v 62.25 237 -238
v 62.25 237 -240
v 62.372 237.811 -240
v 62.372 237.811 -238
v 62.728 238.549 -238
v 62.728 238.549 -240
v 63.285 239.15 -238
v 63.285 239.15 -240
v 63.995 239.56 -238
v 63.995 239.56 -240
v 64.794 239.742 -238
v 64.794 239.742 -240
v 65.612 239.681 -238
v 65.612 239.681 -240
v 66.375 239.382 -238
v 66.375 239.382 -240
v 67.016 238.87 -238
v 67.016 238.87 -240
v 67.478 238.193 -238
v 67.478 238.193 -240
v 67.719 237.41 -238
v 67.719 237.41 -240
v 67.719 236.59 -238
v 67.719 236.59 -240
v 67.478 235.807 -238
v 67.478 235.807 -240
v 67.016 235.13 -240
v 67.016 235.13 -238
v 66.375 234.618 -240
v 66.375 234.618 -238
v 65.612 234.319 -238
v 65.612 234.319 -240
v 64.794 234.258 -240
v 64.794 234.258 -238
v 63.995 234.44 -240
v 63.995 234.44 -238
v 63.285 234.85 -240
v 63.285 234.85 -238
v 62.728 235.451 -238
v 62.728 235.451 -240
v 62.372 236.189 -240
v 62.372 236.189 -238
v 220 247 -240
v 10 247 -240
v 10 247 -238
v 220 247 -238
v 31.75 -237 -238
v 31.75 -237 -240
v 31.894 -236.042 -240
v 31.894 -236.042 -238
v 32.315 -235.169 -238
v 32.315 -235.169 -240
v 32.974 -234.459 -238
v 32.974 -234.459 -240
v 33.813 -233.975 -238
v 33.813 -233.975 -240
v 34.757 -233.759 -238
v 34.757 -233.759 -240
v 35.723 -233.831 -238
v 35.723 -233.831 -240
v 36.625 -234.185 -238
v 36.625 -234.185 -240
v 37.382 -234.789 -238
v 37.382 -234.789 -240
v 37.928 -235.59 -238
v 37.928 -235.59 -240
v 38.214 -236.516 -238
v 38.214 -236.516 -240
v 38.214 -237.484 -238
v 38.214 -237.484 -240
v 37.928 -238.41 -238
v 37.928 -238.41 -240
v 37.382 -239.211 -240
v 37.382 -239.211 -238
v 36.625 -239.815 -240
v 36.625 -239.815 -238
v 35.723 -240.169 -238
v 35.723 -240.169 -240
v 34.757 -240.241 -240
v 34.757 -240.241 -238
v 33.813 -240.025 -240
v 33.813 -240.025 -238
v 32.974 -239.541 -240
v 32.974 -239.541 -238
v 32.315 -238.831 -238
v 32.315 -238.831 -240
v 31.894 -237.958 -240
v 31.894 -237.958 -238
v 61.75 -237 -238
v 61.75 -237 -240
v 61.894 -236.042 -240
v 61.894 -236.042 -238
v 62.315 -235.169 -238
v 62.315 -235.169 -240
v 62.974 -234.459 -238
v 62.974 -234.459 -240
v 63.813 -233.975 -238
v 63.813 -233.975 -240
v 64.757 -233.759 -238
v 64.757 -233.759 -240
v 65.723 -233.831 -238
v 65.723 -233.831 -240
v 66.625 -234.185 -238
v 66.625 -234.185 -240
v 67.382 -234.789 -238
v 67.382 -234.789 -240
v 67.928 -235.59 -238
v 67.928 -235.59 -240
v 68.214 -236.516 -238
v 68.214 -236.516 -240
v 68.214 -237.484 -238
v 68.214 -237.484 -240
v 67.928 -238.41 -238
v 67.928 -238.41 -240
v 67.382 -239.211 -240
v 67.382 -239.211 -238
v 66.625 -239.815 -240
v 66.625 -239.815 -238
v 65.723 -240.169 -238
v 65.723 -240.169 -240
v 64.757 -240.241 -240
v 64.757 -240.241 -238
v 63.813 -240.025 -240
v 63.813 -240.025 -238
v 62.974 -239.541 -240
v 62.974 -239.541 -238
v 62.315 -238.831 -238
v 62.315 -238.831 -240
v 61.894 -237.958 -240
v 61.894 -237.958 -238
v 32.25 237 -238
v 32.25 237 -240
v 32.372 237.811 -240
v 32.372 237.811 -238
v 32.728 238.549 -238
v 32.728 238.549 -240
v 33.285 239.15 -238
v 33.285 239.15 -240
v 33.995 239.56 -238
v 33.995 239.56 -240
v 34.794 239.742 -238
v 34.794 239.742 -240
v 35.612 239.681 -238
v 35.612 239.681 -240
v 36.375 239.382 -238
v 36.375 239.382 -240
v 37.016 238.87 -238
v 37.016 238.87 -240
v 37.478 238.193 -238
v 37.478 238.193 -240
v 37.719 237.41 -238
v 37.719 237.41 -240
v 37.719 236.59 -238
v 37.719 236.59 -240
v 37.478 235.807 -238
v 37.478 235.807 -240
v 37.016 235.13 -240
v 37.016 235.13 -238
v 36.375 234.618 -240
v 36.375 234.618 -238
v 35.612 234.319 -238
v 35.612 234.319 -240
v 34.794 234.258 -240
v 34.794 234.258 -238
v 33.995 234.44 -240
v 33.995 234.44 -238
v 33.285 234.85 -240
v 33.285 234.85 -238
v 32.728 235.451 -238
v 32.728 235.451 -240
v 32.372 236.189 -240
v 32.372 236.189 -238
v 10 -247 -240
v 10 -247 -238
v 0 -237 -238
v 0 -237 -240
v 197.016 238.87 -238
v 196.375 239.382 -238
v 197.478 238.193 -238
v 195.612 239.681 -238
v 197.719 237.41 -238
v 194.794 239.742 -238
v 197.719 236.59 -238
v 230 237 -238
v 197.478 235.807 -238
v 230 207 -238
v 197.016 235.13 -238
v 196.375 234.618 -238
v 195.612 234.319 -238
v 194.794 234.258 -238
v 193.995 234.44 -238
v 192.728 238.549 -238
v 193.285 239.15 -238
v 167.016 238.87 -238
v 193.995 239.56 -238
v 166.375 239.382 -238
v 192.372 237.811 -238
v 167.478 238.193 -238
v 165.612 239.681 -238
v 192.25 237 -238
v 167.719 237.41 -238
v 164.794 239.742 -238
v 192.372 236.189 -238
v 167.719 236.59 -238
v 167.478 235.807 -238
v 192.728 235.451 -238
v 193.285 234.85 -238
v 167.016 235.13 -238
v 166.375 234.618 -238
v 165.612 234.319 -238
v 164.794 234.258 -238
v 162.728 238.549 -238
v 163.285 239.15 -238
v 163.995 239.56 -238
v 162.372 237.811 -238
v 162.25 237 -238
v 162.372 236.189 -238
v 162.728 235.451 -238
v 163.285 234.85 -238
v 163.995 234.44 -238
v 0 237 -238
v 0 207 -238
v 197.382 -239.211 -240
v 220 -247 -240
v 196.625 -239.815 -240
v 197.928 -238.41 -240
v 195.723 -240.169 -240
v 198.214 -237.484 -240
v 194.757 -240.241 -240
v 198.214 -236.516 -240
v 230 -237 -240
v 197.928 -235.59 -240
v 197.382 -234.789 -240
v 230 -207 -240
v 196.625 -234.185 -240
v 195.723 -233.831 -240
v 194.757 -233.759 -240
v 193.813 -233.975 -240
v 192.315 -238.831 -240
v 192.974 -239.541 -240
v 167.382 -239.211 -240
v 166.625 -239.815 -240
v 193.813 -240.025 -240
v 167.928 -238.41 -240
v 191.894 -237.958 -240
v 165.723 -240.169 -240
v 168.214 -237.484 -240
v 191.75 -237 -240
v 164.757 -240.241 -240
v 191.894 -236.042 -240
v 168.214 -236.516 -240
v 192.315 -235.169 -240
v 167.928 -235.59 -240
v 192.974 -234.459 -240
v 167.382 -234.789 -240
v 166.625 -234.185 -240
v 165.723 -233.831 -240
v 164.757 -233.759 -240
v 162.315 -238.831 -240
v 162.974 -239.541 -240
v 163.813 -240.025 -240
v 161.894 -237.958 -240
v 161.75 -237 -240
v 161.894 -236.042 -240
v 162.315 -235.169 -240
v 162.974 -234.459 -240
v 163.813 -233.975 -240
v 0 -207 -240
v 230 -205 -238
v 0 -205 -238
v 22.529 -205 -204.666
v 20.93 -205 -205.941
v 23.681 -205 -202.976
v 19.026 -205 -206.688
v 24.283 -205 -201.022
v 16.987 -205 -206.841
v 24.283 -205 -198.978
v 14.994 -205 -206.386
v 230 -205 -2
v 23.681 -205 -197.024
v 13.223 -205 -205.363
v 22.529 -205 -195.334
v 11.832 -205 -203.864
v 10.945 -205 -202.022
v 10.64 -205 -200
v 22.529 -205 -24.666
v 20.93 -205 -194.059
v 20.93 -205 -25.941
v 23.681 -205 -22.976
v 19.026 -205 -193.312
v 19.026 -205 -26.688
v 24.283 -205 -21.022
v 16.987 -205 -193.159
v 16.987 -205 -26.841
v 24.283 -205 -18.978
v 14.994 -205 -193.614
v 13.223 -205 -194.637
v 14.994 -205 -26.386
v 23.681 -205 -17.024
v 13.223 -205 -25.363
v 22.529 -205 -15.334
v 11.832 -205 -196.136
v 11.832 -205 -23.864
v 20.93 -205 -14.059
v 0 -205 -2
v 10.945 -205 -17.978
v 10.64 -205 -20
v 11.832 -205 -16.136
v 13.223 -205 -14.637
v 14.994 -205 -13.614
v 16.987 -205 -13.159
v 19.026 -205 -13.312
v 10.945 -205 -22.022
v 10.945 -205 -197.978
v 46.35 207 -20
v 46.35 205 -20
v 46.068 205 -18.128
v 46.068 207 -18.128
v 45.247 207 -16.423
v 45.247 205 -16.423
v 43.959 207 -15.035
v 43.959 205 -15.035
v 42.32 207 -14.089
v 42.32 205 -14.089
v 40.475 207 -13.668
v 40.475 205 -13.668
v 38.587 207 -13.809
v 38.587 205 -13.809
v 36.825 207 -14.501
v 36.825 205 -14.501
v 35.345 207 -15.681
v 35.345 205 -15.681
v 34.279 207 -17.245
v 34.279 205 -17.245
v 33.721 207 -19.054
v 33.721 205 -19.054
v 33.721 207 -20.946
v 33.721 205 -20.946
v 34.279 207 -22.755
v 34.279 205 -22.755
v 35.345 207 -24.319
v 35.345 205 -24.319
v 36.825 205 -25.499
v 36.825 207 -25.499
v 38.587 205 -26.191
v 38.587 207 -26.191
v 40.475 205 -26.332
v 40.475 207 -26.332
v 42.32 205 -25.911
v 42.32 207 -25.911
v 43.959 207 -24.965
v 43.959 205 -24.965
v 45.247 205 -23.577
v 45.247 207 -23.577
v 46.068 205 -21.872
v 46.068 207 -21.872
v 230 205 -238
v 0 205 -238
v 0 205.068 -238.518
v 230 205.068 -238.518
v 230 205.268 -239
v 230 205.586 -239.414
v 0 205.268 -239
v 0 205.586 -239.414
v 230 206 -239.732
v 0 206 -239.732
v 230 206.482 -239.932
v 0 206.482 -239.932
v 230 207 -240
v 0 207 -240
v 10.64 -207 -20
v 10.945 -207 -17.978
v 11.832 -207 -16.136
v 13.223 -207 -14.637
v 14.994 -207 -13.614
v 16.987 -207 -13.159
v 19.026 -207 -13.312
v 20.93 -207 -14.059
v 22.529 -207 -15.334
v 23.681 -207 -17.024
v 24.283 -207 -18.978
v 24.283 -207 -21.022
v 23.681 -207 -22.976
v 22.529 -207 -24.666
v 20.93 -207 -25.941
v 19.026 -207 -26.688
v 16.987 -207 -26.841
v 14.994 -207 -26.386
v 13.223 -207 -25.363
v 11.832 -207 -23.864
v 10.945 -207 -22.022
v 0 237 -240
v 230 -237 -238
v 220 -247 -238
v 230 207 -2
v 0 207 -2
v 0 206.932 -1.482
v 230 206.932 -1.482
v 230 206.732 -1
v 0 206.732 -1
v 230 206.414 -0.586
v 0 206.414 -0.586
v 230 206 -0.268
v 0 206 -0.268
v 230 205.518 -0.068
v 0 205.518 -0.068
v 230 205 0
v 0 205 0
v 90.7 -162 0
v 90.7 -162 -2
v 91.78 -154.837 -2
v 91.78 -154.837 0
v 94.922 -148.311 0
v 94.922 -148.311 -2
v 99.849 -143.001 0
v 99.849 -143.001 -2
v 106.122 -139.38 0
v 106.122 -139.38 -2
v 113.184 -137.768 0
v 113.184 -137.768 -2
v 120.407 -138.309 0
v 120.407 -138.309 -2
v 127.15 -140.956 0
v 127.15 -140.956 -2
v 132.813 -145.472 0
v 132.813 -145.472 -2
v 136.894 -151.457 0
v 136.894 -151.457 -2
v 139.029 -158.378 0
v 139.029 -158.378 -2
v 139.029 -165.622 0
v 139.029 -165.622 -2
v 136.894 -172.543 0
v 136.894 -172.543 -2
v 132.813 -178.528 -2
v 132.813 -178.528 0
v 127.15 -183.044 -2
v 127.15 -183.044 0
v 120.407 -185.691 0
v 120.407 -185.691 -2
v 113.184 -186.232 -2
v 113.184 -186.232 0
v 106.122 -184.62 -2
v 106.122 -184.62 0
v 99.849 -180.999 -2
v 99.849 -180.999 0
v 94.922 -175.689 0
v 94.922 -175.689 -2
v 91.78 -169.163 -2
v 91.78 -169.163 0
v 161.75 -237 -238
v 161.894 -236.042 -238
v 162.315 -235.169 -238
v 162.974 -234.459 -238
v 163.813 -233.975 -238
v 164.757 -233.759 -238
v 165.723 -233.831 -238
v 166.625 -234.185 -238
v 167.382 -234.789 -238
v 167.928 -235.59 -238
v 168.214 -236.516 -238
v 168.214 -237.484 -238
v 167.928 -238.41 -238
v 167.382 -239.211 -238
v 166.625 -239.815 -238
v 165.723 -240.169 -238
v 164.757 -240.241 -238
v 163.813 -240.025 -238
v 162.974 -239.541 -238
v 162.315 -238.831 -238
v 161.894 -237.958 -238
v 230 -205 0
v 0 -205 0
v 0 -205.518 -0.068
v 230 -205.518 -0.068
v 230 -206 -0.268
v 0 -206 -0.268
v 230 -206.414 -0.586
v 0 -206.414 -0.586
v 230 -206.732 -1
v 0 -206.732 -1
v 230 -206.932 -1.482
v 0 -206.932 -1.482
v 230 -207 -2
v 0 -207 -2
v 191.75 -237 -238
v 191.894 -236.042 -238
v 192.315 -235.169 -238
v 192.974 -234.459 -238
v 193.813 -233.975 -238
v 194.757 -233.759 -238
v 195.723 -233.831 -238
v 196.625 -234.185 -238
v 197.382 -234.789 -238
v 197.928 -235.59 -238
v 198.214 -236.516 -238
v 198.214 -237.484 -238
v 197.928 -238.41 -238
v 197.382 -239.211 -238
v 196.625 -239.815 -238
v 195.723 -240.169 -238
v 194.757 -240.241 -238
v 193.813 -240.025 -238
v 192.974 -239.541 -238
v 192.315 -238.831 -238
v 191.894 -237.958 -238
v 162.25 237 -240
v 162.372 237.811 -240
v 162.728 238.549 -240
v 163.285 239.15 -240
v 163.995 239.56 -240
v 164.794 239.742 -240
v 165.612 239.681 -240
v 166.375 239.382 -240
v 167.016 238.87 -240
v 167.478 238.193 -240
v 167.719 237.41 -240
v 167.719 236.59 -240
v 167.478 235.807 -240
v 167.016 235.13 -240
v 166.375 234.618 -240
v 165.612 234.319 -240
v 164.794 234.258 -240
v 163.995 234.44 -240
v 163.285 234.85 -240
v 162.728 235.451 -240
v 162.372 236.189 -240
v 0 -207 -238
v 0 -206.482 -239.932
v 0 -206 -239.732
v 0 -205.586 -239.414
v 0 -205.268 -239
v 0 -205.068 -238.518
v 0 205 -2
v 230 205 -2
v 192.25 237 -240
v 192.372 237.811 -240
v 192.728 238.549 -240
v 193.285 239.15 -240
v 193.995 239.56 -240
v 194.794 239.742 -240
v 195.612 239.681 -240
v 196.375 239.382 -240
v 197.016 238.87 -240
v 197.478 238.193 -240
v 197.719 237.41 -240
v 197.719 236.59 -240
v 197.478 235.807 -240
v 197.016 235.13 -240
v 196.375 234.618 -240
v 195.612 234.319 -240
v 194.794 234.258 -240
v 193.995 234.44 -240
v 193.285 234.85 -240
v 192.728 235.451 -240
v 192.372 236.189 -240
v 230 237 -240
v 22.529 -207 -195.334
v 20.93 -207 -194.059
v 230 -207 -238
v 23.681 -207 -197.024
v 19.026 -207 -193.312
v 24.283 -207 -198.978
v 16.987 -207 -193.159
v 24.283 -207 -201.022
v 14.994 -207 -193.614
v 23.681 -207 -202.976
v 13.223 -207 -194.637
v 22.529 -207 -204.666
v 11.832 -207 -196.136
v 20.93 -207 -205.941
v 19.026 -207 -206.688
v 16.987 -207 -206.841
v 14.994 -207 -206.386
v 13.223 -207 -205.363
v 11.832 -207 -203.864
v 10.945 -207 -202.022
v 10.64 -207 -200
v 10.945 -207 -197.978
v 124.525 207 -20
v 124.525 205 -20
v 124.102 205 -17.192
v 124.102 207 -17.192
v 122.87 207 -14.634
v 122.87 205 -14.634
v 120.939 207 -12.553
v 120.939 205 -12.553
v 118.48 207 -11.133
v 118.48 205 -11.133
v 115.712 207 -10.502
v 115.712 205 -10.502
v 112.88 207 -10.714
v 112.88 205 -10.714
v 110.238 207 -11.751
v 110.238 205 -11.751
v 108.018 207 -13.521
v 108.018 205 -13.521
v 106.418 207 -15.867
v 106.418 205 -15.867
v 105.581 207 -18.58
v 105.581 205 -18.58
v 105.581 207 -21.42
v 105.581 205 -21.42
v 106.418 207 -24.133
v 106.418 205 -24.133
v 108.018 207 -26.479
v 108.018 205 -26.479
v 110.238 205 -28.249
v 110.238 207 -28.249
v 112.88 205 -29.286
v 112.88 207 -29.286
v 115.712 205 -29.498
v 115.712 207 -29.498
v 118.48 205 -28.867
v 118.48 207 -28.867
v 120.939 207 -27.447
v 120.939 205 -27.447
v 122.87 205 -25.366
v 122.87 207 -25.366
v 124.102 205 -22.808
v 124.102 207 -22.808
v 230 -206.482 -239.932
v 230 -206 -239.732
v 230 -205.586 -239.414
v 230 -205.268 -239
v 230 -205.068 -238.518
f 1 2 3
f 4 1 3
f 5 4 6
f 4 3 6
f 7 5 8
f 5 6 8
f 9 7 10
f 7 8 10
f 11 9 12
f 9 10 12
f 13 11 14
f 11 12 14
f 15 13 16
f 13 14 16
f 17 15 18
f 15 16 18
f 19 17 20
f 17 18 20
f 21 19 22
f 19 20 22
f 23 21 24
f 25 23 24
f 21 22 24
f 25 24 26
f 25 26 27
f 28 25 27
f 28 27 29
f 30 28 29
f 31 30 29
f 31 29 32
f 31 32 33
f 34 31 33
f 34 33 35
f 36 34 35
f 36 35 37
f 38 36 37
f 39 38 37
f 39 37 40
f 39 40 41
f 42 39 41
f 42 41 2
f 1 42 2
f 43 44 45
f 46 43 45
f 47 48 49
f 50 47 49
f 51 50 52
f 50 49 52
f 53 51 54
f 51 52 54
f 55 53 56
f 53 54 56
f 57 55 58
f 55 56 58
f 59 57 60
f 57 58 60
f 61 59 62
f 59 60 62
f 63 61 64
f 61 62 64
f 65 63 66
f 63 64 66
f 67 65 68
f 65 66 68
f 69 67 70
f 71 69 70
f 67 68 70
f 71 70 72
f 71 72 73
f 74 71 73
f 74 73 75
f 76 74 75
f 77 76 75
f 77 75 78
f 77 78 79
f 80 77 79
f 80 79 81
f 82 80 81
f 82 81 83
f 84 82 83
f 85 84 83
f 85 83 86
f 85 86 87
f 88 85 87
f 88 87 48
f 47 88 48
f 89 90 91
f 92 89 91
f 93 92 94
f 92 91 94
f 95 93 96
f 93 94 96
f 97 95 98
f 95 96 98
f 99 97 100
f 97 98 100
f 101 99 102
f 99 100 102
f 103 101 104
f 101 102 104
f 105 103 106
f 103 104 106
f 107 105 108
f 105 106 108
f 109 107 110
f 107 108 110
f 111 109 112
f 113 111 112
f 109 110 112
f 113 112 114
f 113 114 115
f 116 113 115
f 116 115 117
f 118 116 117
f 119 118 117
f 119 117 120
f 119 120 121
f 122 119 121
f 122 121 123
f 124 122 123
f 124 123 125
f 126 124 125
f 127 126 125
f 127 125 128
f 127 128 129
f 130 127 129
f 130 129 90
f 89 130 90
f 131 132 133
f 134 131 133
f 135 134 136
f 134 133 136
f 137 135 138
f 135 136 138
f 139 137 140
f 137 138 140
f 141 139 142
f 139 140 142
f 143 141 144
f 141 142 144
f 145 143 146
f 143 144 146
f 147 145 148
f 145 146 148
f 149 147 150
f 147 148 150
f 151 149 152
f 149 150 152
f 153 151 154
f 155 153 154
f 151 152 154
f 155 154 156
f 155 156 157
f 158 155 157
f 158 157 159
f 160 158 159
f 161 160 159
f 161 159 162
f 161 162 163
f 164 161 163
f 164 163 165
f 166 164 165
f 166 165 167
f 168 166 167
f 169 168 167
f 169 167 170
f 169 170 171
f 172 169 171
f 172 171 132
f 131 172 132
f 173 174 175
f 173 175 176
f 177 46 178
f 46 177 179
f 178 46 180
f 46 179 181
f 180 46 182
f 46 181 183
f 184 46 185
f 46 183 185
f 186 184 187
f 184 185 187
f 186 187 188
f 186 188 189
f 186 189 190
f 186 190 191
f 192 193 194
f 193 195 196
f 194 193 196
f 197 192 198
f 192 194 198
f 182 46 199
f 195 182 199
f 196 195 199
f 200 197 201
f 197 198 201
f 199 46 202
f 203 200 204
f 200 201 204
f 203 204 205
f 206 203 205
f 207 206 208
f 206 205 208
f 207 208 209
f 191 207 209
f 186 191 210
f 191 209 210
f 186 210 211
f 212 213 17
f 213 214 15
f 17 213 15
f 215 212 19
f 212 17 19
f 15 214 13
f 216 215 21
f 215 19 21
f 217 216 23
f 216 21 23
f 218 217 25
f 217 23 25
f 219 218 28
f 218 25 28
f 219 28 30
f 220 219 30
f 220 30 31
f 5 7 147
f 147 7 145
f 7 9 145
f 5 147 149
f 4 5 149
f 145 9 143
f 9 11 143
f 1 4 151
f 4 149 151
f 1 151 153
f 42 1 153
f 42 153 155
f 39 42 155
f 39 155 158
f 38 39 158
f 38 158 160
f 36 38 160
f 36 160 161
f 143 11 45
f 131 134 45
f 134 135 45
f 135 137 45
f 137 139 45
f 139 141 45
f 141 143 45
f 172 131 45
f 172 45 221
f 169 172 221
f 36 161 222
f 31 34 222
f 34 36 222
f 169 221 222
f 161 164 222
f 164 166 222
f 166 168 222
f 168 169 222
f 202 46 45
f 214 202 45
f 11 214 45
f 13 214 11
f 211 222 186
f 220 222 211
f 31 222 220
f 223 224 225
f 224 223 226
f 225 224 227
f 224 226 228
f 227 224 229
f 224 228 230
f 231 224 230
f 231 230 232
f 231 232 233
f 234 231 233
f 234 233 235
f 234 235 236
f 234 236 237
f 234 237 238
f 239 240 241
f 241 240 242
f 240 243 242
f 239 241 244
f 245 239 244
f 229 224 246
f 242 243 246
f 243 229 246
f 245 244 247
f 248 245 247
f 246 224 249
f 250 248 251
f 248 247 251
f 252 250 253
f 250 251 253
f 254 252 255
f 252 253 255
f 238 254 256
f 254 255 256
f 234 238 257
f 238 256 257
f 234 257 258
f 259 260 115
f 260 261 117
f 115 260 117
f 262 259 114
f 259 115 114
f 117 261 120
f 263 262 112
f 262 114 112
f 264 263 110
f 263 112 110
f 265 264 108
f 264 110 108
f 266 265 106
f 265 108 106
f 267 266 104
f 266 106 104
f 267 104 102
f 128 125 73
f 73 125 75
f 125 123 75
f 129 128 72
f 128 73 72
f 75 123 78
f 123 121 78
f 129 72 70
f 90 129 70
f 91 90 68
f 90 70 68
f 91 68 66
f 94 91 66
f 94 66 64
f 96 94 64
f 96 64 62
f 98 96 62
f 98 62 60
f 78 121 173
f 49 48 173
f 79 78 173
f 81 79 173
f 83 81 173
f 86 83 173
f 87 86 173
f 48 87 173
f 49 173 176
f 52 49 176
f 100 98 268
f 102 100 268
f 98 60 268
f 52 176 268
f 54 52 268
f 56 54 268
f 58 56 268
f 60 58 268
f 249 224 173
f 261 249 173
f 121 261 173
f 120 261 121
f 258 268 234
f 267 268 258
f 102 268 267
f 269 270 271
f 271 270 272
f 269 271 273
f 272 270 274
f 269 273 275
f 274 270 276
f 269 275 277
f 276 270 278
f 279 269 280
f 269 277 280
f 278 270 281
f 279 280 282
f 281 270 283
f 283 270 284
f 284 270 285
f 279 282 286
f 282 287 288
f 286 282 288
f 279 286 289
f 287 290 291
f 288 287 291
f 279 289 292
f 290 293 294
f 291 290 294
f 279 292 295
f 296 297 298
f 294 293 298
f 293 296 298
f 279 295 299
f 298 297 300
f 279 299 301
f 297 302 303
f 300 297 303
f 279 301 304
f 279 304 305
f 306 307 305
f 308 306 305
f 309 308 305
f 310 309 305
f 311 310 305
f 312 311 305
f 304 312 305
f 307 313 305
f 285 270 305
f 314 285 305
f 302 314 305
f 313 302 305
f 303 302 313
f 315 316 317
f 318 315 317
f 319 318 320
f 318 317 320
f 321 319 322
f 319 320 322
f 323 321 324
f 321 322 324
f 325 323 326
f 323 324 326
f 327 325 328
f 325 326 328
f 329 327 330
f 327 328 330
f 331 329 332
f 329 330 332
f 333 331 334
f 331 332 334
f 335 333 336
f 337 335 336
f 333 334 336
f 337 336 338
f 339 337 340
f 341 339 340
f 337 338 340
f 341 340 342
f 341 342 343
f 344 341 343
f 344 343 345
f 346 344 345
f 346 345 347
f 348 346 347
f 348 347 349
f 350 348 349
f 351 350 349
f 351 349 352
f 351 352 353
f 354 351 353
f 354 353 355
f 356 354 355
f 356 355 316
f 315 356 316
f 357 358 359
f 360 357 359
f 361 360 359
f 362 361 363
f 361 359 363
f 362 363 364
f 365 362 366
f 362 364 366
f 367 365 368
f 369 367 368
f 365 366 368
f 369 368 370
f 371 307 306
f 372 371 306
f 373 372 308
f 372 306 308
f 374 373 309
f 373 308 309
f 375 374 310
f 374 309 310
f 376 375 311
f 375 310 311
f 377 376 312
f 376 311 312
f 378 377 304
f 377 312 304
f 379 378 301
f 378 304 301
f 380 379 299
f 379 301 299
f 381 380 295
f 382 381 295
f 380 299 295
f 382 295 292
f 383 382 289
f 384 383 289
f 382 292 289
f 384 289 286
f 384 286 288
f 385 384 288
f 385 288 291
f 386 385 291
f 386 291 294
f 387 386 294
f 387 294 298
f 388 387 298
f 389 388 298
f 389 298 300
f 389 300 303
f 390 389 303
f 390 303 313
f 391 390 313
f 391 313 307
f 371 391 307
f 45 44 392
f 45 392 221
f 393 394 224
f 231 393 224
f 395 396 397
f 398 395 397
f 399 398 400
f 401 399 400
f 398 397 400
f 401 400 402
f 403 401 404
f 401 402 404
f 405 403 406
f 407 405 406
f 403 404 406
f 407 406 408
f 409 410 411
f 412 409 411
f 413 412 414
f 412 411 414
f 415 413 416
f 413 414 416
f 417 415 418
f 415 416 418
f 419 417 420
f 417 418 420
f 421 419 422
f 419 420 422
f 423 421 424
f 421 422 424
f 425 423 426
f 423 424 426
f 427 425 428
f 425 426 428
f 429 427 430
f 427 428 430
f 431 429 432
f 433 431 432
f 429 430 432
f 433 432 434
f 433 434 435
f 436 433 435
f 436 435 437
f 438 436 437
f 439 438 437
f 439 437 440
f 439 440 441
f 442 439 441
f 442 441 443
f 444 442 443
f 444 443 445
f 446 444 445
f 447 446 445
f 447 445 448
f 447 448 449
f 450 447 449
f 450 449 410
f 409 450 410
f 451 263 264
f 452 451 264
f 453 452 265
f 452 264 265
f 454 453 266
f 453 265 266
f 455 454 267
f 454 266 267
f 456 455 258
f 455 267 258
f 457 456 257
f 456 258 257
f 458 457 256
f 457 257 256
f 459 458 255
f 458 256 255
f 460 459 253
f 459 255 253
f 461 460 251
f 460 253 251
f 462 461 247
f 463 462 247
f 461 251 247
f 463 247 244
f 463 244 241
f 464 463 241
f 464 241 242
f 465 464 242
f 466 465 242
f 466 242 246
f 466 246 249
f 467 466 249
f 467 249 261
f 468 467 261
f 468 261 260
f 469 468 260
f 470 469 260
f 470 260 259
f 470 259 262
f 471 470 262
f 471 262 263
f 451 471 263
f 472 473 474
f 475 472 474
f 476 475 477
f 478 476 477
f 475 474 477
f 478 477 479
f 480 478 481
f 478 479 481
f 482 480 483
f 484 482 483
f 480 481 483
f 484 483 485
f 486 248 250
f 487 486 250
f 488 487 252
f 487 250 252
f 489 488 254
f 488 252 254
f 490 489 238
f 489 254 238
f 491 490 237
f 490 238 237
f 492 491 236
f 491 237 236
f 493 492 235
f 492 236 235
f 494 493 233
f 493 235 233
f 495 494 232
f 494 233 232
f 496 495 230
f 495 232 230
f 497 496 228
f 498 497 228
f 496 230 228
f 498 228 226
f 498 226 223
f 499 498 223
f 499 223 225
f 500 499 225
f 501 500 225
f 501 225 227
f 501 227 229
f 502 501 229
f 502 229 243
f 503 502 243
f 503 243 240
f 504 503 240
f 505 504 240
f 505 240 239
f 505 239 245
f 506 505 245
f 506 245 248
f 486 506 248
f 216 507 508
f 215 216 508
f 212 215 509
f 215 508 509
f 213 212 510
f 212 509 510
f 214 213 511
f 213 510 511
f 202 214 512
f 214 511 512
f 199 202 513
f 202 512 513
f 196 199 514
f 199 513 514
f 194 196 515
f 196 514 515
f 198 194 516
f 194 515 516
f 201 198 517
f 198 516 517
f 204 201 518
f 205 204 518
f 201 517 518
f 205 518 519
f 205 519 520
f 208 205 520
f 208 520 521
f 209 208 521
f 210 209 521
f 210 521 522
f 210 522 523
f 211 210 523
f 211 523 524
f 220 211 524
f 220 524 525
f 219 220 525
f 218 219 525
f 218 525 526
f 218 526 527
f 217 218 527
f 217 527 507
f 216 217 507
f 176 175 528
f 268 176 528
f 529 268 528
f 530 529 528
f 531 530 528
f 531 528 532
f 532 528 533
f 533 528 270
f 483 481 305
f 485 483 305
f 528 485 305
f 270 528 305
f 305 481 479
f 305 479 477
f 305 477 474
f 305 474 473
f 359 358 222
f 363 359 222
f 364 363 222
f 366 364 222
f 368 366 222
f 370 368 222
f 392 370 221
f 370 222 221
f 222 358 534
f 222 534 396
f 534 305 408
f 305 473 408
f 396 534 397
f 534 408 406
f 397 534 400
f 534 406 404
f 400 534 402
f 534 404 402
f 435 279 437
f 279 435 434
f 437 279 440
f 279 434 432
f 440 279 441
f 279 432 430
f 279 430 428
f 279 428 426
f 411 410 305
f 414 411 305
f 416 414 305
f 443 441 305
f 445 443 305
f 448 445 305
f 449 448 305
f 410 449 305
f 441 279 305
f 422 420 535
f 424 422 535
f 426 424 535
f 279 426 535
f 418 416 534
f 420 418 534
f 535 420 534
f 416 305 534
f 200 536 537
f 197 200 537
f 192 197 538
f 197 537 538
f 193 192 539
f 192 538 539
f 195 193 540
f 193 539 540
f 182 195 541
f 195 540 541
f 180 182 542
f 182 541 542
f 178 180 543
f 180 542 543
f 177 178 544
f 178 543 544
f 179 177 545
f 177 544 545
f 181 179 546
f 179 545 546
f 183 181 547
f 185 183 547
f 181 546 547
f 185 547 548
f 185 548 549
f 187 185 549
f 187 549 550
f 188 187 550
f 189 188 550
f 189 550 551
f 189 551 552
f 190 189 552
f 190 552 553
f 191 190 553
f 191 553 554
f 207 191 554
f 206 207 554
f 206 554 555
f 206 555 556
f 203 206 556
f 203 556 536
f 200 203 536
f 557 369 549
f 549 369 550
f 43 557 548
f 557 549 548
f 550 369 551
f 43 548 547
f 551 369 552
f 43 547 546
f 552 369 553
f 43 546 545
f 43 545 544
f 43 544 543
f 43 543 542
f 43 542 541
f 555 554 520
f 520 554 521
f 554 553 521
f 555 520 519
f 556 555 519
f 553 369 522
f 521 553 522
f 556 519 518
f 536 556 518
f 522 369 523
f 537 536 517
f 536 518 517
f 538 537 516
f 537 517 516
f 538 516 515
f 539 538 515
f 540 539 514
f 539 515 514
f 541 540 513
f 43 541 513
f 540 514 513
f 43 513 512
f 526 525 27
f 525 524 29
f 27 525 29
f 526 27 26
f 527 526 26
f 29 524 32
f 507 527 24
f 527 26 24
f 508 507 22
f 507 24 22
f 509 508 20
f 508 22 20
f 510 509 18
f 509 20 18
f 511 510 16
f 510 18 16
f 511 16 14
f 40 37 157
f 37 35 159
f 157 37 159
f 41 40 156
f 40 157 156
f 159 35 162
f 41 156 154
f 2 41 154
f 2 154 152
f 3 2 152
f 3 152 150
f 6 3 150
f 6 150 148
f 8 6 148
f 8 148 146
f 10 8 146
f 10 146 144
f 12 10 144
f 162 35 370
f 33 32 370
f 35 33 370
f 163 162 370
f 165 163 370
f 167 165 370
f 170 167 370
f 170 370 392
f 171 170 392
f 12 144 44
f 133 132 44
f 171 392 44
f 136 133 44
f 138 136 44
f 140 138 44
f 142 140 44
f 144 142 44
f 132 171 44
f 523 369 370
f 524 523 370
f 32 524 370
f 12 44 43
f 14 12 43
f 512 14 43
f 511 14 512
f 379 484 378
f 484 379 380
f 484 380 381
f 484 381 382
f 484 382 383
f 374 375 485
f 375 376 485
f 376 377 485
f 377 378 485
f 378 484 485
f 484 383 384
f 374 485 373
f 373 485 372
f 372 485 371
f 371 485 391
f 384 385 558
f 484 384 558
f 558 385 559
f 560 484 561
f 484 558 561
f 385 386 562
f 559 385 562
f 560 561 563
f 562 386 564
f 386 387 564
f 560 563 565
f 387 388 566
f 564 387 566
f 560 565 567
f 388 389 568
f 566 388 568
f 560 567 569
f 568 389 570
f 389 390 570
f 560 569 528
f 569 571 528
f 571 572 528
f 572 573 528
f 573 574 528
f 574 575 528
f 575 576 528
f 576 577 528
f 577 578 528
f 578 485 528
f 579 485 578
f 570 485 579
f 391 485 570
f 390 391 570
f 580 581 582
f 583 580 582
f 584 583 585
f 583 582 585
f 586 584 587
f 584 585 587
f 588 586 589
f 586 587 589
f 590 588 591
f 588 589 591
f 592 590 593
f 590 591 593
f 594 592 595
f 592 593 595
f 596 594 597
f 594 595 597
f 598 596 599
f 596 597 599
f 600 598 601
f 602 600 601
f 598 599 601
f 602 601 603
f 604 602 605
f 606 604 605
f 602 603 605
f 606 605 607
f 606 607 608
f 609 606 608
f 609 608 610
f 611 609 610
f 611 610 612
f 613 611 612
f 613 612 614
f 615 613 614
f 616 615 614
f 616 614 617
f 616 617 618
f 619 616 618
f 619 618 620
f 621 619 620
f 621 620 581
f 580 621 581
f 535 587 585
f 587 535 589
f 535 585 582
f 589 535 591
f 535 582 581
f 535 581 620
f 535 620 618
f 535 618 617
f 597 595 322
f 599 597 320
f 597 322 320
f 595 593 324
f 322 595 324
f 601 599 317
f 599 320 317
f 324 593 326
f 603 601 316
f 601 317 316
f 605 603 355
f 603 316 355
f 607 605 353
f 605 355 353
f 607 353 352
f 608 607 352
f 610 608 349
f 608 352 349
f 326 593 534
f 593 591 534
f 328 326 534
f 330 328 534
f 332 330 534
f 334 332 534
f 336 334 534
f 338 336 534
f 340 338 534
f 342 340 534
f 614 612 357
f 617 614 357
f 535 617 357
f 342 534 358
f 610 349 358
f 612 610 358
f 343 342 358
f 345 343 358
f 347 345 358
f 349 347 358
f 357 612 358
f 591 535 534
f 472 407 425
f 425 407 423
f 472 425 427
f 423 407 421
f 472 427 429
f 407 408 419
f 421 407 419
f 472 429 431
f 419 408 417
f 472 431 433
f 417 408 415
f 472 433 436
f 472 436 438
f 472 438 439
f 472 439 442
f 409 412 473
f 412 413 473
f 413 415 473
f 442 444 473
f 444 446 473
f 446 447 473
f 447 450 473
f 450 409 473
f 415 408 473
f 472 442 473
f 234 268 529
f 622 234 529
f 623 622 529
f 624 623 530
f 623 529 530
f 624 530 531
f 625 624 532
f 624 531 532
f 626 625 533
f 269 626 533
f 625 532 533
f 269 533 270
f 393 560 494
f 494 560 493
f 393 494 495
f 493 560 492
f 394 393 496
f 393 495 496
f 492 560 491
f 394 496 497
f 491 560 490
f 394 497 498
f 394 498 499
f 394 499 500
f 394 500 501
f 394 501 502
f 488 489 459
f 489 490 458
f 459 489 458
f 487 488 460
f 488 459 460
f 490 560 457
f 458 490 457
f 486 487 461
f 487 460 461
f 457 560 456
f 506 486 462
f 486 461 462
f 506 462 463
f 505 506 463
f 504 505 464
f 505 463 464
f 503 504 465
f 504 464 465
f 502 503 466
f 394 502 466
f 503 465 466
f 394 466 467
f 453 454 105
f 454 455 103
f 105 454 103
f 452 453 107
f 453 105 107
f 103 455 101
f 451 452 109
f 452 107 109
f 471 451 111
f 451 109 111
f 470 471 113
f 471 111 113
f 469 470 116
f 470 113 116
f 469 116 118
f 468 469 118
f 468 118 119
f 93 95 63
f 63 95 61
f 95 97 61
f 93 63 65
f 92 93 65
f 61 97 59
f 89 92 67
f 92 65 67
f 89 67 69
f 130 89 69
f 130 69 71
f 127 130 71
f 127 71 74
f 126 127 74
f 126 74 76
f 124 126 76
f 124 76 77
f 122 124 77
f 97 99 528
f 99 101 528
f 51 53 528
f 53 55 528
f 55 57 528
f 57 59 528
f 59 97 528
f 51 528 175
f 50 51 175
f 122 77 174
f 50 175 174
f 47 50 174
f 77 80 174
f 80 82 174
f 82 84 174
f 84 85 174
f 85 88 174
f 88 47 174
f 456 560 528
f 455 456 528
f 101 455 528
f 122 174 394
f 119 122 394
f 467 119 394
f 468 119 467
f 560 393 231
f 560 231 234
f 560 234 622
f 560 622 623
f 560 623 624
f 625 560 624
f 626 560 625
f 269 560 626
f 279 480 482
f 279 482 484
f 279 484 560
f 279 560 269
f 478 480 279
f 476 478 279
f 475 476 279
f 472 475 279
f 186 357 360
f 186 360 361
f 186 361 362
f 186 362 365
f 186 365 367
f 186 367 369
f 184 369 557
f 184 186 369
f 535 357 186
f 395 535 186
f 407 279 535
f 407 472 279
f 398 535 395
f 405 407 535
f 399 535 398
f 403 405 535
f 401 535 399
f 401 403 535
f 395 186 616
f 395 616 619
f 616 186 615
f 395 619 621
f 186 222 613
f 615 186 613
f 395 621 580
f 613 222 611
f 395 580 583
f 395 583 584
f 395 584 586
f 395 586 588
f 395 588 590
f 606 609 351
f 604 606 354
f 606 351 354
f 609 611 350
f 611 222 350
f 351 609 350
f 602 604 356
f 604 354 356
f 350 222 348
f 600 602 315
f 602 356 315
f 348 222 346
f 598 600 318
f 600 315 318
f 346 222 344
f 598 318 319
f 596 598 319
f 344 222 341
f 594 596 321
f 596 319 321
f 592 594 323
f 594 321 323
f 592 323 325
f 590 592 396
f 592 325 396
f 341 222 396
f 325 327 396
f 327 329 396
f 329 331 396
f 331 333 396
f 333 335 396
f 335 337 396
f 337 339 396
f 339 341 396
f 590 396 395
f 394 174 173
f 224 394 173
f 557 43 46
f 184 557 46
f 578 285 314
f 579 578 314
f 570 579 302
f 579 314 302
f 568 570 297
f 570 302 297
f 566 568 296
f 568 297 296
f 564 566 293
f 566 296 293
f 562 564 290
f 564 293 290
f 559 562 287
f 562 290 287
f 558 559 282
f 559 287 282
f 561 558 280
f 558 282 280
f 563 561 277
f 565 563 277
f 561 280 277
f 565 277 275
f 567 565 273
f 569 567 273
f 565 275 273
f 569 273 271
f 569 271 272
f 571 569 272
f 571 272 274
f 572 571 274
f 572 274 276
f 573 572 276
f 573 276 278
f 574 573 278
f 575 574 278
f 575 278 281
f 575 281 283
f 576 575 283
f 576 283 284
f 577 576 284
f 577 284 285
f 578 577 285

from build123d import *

# Parameters (mm, degrees)
F1_DEPTH  = 230
F3_D      = 48.6
F5_D      = 6.5
F6_D      = 5.5
F7_SIZE   = 10
F9_D      = 13.72
F9_DEPTH  = 5
F11_D     = 19.05
F11_DEPTH = 5
F12_D     = 12.7
F12_DEPTH = 5


with BuildPart() as f1:
    # F0 (on Right) → F1 (new body)
    with BuildSketch(Plane.YZ):
        with BuildLine():
            Line((205, 0), (-205, 0))
            ThreePointArc((-205, 0), (-206.414214, -0.585786), (-207, -2))
            Line((-207, -2), (-207, -238))
            Line((-207, -238), (-247, -238))
            Line((-247, -238), (-247, -240))
            Line((-247, -240), (-207, -240))
            ThreePointArc((-207, -240), (-205.585786, -239.414214), (-205, -238))
            Line((-205, -238), (-205, -2))
            Line((-205, -2), (205, -2))
            Line((205, -2), (205, -238))
            ThreePointArc((205, -238), (205.585786, -239.414214), (207, -240))
            Line((207, -240), (247, -240))
            Line((247, -240), (247, -238))
            Line((247, -238), (207, -238))
            Line((207, -238), (207, -2))
            ThreePointArc((207, -2), (206.414214, -0.585786), (205, 0))
        make_face()
    extrude(amount=F1_DEPTH)

    # F3 (through all)
    with Locations(Plane.XY):
        with Locations((115, -162)):
            Hole(F3_D / 2)

    # F5 (through all)
    with Locations(Plane.XY.offset(-238)):
        with Locations((35, -237), (65, -237), (165, -237), (195, -237)):
            Hole(F5_D / 2)

    # F6 (through all)
    with Locations(Plane.XY.offset(-238)):
        with Locations((35, 237), (65, 237), (165, 237), (195, 237)):
            Hole(F6_D / 2)

    # F7
    f7_edges = [f1.edges().sort_by_distance(p)[0] for p in [
        (0, -247, -239),
        (230, -247, -239),
        (230, 247, -239),
        (0, 247, -239),
    ]]
    chamfer(f7_edges, length=F7_SIZE)

    # F9
    with Locations(Plane.XZ.offset(207)):
        with Locations((17.5, -20), (17.5, -200)):
            Hole(F9_D / 2, depth=F9_DEPTH)

    # F11
    with Locations(Plane(origin=(0, 207, 0), x_dir=(-1, 0, 0), z_dir=(0, 1, 0))):
        with Locations((-115, -20)):
            Hole(F11_D / 2, depth=F11_DEPTH)

    # F12
    with Locations(Plane(origin=(0, 207, 0), x_dir=(-1, 0, 0), z_dir=(0, 1, 0))):
        with Locations((-40, -20)):
            Hole(F12_D / 2, depth=F12_DEPTH)


solid = f1.part
